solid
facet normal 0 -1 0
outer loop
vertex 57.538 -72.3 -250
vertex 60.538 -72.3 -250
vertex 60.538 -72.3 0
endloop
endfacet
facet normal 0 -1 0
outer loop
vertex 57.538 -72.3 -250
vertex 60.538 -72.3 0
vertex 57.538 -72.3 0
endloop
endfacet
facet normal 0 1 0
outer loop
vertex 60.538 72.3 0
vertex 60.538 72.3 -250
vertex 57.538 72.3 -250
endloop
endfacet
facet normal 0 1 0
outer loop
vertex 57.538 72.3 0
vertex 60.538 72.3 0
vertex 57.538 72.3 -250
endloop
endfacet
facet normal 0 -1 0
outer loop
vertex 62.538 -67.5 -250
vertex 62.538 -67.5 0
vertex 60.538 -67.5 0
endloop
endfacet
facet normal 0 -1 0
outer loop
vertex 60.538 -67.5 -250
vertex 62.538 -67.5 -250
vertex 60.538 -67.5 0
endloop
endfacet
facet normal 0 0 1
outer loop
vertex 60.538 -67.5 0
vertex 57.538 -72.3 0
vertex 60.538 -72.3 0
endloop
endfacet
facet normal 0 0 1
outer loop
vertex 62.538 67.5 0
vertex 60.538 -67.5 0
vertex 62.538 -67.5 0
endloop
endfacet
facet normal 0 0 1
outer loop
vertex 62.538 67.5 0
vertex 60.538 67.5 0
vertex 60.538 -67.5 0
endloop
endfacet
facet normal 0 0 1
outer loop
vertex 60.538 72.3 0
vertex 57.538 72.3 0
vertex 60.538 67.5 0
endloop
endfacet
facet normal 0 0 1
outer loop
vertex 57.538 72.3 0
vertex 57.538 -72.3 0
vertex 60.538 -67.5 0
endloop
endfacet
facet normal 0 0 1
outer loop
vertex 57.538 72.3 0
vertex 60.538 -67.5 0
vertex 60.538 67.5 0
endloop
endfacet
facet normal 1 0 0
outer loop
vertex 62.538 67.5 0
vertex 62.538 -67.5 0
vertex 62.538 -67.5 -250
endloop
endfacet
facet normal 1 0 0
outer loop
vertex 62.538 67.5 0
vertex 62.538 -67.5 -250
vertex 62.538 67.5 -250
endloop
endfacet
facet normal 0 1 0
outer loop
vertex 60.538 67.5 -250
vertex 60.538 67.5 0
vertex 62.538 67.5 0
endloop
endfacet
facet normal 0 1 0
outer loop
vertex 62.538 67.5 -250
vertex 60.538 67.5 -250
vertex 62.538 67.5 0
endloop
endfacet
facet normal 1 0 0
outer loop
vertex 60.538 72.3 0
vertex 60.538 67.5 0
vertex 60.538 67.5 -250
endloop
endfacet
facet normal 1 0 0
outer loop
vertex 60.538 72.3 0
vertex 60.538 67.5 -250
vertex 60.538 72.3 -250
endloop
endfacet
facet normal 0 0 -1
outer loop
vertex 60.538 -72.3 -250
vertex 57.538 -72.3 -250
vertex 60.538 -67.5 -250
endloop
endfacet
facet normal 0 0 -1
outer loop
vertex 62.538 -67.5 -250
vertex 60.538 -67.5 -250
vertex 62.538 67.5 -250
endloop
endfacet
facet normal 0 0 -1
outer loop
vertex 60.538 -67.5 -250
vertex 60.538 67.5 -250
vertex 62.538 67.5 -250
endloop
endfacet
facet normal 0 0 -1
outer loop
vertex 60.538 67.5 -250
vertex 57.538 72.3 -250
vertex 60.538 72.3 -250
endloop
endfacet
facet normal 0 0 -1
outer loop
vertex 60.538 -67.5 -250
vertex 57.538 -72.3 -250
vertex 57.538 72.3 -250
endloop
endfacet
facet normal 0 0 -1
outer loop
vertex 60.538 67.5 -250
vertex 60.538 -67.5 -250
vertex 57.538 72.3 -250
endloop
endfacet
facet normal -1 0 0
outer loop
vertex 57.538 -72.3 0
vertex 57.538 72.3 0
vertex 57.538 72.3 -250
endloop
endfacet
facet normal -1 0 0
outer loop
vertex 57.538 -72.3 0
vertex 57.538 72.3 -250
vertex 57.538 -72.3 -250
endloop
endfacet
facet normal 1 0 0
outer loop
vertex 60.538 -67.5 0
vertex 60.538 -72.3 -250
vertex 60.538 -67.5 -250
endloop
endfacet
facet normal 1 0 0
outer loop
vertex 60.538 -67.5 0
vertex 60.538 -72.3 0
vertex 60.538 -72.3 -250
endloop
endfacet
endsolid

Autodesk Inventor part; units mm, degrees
ref_plane "YZ Plane" through (0, 0, 0) normal (1, 0, 0) x (0, 1, 0)
ref_plane "XZ Plane" through (0, 0, 0) normal (0, 1, 0) x (-1, 0, 0)
ref_plane "Work Plane1" through (0, 0, 0) normal (0, 0, 1) x (1, 0, 0)
sketch "Sketch1" plane through (0, 0, 0) normal (0, 0, 1) x (1, 0, 0)
  line L0 (62.538, -67.5) -> (62.538, 67.5) projected
  line L1 (57.538, 75) -> (57.538, -75) projected
  line L2 (60.538, 72.3) -> (57.538, 72.3) projected
  line L3 (60.538, 67.5) -> (60.538, 72.5) projected
  line L4 (60.538, -72.3) -> (57.538, -72.3) projected
  line L5 (60.538, -72.5) -> (60.538, -67.5) projected
  line L6 (62.538, -67.5) -> (60.538, -67.5) projected
  line L7 (57.538, 72.3) -> (60.538, 72.3)
  line L8 (60.538, 72.3) -> (60.538, -72.3)
  line L9 (60.538, -72.3) -> (57.538, -72.3)
  line L10 (57.538, -72.3) -> (57.538, 72.3)
  line L11 (62.538, -67.5) -> (60.538, -67.5)
  line L12 (60.538, -67.5) -> (60.538, 67.5)
  line L13 (60.538, 67.5) -> (62.538, 67.5)
  line L14 (62.538, 67.5) -> (62.538, -67.5)
  spline S0 degree 3 poles (88.1745, 80.1336) (86.4644, 80.1539) (84.1903, 80.1768) (79.3721, 80.2194) (76.1158, 80.2429) (70.2528, 80.2817) (68.432, 80.2919) (65.9587, 80.3052) knots 0.050371 0.050371 0.050371 0.050371 3.844611 3.844611 8.630626 8.630626 13.703565 13.703565 13.703565 13.703565 projected
  point P0 (0, 0)
  point P1 (62.538, 67.5)
  point P2 (57.538, 72.3)
  point P3 (57.538, -72.3)
ref_plane "Work Plane2" through (-62.538, -75, -250) normal (0, 0, 1) x (1, 0, 0)
extrude "Extrusion1" add sketch "Sketch1" against normal up to surface (250 mm away)
equation "\"BendRadius\" = Thickness"
equation "\"BendReliefWidth\" = Thickness"
equation "\"BendReliefDepth\" = 0.5 * Thickness"
equation "\"CornerReliefSize\" = 4 * Thickness"
equation "\"MinimumRemnant\" = 2 * Thickness"
equation "\"TransitionRadius\" = BendRadius"
equation "\"JacobiRadiusSize\" = BendRadius"
equation "\"GapSize\" = Thickness"
equation "\"Thickness\" = 3.048"
properties part number "Lid1" material "Plastic, Opaque White"
